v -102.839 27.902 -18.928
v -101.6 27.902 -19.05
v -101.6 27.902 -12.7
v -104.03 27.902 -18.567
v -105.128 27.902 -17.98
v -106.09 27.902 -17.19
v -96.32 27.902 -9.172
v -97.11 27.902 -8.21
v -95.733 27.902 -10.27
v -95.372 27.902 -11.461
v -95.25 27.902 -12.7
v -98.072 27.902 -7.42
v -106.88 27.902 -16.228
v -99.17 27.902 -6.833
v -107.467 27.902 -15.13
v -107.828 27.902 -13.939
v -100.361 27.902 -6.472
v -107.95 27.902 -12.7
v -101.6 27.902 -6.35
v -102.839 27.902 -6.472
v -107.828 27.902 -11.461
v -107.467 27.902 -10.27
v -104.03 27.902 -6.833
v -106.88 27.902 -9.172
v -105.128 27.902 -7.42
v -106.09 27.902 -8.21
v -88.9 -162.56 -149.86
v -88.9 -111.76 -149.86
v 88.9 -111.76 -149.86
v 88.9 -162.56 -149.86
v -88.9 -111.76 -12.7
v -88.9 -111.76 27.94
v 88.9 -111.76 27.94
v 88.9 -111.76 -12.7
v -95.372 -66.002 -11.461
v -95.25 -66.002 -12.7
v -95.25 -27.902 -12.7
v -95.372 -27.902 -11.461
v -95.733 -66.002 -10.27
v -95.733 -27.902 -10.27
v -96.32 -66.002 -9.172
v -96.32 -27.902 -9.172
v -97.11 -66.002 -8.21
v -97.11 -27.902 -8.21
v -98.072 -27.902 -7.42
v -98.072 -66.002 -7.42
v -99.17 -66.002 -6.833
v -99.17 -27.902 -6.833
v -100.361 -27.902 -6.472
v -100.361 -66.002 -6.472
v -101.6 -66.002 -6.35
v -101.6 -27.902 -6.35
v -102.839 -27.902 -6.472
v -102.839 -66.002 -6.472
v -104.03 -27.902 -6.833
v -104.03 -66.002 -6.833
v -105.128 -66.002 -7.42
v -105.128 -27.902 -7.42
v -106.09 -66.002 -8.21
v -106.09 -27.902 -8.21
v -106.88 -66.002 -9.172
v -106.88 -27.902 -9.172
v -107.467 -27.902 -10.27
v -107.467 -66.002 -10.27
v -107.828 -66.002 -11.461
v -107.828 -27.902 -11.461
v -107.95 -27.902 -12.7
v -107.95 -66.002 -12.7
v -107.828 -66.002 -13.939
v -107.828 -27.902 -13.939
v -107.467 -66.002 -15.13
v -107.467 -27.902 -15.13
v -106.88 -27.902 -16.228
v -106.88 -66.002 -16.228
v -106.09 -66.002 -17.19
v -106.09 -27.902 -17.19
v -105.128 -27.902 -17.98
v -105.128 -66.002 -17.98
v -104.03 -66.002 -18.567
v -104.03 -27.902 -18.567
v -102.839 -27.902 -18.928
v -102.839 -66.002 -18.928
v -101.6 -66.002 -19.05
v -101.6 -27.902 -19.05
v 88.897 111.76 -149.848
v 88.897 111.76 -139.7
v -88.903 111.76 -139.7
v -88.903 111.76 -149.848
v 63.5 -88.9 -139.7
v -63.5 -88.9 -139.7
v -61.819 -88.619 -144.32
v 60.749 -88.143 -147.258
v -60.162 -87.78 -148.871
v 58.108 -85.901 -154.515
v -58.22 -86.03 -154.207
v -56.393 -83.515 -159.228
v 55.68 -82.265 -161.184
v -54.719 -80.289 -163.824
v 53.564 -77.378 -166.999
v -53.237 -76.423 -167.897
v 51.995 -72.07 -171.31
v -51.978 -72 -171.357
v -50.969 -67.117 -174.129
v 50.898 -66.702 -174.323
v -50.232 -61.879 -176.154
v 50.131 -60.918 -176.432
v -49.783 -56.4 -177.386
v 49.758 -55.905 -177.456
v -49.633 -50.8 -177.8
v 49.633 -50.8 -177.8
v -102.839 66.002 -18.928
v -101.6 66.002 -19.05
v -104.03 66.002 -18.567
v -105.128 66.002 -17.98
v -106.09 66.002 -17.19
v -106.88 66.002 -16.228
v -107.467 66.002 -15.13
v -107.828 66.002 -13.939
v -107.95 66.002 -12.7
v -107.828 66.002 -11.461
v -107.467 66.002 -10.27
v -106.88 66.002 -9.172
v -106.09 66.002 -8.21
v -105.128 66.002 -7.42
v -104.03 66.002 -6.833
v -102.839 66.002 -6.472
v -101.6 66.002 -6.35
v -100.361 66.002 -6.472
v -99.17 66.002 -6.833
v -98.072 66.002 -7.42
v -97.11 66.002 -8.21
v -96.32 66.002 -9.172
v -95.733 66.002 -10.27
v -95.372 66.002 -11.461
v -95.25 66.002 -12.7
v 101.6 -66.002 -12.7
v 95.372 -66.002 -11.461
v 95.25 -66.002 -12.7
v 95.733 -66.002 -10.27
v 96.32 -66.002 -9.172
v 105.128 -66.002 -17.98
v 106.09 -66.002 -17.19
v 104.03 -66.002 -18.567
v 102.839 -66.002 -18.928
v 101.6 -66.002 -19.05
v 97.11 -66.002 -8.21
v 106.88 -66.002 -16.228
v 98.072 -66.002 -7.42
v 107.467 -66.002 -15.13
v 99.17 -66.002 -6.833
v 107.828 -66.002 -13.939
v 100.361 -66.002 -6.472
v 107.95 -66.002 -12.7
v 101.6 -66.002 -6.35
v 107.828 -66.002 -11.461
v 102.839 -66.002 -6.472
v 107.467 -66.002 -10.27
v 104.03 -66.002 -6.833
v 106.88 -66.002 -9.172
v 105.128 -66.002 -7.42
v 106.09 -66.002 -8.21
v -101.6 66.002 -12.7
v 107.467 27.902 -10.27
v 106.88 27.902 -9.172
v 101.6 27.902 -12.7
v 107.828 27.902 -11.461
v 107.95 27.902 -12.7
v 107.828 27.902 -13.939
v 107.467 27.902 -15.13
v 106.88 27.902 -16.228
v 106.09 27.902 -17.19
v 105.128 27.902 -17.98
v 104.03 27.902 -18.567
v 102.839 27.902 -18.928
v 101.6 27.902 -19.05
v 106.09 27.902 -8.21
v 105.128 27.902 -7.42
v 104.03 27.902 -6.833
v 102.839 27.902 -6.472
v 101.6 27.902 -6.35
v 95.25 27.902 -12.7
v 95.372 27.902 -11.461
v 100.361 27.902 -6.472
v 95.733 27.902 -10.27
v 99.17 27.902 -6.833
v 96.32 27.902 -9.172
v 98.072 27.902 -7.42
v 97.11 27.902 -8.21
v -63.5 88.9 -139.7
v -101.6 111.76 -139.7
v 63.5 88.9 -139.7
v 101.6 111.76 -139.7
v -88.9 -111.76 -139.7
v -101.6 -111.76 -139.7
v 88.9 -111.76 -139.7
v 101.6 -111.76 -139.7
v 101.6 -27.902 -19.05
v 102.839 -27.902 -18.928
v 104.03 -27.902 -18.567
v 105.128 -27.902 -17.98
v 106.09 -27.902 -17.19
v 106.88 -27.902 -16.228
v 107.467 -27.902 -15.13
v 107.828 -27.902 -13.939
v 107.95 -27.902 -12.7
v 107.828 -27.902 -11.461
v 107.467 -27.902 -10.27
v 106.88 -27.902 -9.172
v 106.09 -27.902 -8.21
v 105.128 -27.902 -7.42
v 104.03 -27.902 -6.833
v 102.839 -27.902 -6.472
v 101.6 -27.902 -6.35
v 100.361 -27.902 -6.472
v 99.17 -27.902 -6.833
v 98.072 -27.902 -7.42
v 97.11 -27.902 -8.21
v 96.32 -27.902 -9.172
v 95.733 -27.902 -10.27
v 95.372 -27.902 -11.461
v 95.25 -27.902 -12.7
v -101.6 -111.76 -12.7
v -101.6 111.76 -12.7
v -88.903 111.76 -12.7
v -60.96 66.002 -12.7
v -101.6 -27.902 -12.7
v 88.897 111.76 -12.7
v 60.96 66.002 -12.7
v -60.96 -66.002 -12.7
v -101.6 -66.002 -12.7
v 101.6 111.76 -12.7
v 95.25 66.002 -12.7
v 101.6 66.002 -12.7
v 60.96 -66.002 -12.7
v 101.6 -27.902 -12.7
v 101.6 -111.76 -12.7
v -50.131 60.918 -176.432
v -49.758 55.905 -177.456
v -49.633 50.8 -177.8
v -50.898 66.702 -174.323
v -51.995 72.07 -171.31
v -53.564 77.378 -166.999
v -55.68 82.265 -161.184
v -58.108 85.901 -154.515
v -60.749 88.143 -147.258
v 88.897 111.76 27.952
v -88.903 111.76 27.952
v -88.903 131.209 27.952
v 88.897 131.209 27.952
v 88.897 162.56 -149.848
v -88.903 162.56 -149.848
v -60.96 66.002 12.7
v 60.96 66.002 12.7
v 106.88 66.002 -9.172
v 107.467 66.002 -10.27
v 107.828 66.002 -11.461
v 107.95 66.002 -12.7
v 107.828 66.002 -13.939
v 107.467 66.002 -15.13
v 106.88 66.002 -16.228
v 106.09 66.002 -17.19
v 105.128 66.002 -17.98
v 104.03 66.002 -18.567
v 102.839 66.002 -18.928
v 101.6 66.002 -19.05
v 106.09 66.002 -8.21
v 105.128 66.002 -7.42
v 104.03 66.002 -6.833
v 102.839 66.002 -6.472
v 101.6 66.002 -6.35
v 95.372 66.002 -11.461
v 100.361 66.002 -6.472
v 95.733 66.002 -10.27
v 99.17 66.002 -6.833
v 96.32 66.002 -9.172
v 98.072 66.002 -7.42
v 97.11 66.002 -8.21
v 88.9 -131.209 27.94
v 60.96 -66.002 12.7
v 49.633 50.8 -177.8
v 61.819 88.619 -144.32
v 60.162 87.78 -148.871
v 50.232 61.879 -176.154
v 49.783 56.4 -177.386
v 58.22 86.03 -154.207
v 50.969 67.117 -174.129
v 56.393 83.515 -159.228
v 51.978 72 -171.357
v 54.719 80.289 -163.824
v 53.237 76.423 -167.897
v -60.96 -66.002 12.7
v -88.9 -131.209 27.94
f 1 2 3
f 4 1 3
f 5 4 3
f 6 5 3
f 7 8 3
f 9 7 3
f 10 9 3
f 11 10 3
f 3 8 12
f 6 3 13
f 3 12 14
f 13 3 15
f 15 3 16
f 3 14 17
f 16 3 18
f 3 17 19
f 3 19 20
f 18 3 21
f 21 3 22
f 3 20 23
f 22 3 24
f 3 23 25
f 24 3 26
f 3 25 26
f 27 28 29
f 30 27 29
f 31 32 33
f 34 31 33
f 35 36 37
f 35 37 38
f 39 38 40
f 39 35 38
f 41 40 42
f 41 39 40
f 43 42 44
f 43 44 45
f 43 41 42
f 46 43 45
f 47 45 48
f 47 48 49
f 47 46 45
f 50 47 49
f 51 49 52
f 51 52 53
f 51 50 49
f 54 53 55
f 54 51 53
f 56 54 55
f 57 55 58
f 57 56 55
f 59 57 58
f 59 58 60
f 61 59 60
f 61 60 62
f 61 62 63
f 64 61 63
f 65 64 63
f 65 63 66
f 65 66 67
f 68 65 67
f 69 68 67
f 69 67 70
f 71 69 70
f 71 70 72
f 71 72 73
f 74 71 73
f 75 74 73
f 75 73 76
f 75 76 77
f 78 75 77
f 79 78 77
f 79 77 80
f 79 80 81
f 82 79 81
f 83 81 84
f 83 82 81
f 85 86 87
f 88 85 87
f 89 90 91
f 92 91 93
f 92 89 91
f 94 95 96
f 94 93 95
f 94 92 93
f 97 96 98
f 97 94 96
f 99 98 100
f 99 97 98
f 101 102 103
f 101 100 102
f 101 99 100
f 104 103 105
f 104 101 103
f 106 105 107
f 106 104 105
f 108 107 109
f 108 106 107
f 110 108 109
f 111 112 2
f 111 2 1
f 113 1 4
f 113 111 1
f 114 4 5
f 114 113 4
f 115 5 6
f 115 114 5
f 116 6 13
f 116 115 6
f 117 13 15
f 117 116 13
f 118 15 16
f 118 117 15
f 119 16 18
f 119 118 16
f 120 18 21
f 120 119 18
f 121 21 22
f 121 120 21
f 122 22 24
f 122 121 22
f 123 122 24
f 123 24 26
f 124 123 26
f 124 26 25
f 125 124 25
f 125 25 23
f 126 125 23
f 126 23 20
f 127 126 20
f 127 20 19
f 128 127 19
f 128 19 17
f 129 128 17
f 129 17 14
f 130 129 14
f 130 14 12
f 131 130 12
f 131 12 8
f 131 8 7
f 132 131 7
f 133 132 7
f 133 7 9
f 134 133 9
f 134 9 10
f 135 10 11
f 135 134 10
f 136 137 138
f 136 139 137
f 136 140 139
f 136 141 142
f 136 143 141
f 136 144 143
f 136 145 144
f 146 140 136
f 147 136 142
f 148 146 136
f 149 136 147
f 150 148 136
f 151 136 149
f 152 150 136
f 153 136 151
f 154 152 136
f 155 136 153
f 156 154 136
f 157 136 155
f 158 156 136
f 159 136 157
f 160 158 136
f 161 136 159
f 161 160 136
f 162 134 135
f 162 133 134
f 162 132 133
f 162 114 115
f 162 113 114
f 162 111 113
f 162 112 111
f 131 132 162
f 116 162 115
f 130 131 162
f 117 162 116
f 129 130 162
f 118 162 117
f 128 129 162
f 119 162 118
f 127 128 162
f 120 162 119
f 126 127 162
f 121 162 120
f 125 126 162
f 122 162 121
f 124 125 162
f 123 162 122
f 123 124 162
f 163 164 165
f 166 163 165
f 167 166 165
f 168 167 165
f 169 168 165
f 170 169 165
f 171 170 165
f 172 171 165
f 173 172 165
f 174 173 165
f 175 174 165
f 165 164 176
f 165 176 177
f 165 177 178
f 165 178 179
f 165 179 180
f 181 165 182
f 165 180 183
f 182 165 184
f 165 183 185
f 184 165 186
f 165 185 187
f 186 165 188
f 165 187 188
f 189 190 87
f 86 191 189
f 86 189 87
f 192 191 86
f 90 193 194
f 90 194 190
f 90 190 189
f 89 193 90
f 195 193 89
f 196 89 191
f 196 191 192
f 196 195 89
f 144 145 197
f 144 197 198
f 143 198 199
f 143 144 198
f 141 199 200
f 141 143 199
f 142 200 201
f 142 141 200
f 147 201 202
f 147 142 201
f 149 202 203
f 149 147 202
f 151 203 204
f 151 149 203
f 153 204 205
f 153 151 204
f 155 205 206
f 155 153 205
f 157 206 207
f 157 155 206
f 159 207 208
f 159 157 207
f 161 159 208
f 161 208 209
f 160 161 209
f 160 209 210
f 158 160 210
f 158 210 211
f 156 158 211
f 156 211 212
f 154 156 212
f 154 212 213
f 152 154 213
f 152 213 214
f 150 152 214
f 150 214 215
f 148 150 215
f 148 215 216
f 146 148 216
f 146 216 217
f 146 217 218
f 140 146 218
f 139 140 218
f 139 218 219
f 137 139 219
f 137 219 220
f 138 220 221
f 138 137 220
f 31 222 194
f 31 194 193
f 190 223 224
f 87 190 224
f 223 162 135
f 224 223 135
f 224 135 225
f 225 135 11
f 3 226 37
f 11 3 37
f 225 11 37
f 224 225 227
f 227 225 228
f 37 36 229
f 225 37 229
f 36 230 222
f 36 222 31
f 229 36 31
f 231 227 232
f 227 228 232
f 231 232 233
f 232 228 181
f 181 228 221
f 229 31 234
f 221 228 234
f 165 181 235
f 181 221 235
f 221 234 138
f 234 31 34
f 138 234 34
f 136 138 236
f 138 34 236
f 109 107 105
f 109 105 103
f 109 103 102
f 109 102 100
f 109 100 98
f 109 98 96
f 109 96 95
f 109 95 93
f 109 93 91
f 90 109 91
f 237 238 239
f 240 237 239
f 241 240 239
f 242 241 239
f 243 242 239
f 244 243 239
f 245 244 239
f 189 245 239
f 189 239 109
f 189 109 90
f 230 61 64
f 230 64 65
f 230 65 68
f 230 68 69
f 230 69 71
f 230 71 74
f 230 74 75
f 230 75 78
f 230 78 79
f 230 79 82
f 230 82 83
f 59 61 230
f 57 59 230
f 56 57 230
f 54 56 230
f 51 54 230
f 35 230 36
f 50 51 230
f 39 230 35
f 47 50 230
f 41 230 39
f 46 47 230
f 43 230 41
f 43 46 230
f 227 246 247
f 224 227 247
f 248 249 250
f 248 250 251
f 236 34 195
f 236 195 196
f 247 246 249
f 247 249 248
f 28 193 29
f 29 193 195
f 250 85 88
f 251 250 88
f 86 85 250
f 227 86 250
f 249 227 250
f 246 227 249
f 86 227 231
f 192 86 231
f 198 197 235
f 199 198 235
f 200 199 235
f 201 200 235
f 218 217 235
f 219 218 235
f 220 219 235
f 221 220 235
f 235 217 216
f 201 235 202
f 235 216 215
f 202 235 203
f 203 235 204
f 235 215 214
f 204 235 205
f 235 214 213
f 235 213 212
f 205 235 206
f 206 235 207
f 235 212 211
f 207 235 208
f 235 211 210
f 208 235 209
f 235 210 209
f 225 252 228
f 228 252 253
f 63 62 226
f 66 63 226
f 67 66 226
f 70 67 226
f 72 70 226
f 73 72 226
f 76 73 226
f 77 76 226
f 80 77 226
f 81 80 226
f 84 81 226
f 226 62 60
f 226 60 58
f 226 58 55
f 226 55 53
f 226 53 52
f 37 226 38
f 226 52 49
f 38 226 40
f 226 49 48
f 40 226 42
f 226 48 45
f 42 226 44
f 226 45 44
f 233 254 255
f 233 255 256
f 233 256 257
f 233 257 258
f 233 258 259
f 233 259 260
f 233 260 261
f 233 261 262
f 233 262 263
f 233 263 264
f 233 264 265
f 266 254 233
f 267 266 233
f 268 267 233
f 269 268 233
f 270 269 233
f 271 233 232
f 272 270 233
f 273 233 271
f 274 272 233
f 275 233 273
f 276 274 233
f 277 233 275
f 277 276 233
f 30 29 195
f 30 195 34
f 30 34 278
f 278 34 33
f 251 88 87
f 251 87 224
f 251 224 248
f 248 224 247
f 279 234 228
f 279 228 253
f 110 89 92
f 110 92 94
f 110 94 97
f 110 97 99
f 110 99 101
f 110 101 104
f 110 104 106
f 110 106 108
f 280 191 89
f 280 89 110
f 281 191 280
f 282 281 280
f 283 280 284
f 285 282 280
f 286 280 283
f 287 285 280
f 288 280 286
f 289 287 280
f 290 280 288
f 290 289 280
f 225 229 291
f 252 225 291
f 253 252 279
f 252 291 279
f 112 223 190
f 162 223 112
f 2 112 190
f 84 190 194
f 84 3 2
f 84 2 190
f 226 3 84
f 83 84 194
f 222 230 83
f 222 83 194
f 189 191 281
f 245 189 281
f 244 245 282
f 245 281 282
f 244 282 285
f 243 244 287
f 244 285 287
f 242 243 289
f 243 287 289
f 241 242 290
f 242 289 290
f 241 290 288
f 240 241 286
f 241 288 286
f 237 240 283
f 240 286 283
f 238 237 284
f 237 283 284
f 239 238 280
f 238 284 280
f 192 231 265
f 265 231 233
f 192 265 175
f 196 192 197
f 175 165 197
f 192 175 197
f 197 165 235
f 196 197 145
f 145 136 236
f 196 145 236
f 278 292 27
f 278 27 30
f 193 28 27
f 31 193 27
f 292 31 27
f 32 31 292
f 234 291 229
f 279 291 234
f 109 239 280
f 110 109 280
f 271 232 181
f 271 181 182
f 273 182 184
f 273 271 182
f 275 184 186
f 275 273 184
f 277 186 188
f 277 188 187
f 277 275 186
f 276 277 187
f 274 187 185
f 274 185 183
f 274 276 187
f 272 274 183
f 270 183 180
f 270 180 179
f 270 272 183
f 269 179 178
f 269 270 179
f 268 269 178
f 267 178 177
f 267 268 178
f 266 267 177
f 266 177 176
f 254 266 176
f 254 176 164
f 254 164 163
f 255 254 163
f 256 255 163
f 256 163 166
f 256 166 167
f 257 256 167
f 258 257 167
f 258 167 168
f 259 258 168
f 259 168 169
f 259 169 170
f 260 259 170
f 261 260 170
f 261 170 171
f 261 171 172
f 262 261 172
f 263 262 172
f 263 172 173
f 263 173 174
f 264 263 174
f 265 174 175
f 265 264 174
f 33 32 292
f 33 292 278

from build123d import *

# Parameters (mm, degrees)
F0_W        = 121.92
F0_H        = 25.4
F1_DEPTH    = 66.0019
F2_W        = 203.2
F2_H        = 223.52
F3_DEPTH    = 25.4
F2_W_2      = 121.92
F2_H_2      = 132.0038
F4_DEPTH    = 127
F5_W        = 127
F5_H        = 177.8
F6_DEPTH    = 38.1
F7_R        = 38.09999
F8_T1_DEPTH = 299.2776586204
F9_W        = 177.8
F9_H        = 177.8
F10_DEPTH   = 50.8
F11_SIZE2   = 31.350927
F11_SIZE    = 177.79999
F12_W       = 177.8
F12_H       = 177.8
F13_DEPTH   = 50.8
F14_SIZE2   = 31.350927
F14_SIZE    = 177.79999
F15_R       = 6.35
F16_DEPTH   = 38.1
F17_R       = 6.35
F18_DEPTH   = 38.1
F19_R       = 6.35
F20_DEPTH   = 38.1
F21_R       = 6.35
F22_DEPTH   = 38.1


# Not quite as in the source:
# - a fillet or chamfer that OpenCascade refuses, or shapes differently, is made with other operations: its cross-section is extruded or revolved along the edge and cut away or added
# - a fillet or chamfer is up to 0.001 mm smaller than in the source, because OpenCascade refuses the exact size


with BuildPart() as f1:
    # F0 (on Front) → F1 (new body, symmetric)
    with BuildSketch(Plane.XZ):
        Rectangle(F0_W, F0_H)
    extrude(amount=F1_DEPTH, both=True)

    # F2 (on face) → F3 (join)
    with BuildSketch(Plane(origin=(0, 0, -12.7), x_dir=(1, 0, 0), z_dir=(0, 0, -1))):
        Rectangle(F2_W, F2_H)
    extrude(amount=F3_DEPTH)

    # F2 (on face) → F4 (join)
    with BuildSketch(Plane(origin=(0, 0, -12.7), x_dir=(1, 0, 0), z_dir=(0, 0, -1))):
        Rectangle(F2_W, F2_H)
        Rectangle(F2_W_2, F2_H_2, mode=Mode.SUBTRACT)
        Rectangle(F2_W_2, F2_H_2)
    extrude(amount=F4_DEPTH)

    # F5 (on face) → F6 (join)
    with BuildSketch(Plane(origin=(0, 0, -139.7), x_dir=(1, 0, 0), z_dir=(0, 0, -1))):
        Rectangle(F5_W, F5_H)
    extrude(amount=F6_DEPTH)

    # F7 (radius 38.1 in the source; OpenCascade refuses exactly that, so slightly less here)
    f7_edges = [f1.edges().sort_by_distance(p)[0] for p in [
        (0, -88.9, -177.8),
        (0, 88.9, -177.8),
    ]]
    fillet(f7_edges, radius=F7_R)

    # F8: chamfer of 38.1 x 13.8672659255 on 2 edges, made by hand

    # F8_s2 → F8_t1 (cut)
    with BuildSketch(Plane.XZ.offset(-149.6388293102)):
        Polygon((63.5, -139.7), (49.6327340745, -177.8), (63.5, -177.8), align=None)
        Polygon((-49.6327340745, -177.8), (-63.5, -139.7), (-63.5, -177.8), align=None)
    extrude(amount=F8_T1_DEPTH, mode=Mode.SUBTRACT)

    # F9 (on face) → F10 (join)
    with BuildSketch(Plane.XZ.offset(111.76)):
        with Locations((1.431e-07, -60.9599946499)):
            Rectangle(F9_W, F9_H)
    extrude(amount=F10_DEPTH)

    # F11 (size 177.8 and 31.35093717 in the source; OpenCascade refuses exactly that, so slightly less here)
    f11_edges = [f1.edges().sort_by_distance(p)[0] for p in [
        (0, -162.56, 27.940005),
    ]]
    f11_side = f1.faces().sort_by_distance((0, -162.56, -60.959995))[0]
    chamfer(f11_edges, length=F11_SIZE, length2=F11_SIZE2, reference=f11_side)

    # F12 (on face) → F13 (join)
    with BuildSketch(Plane(origin=(0, 111.76, 0), x_dir=(-1, 0, 0), z_dir=(0, 1, 0))):
        with Locations((0.0031362507, -60.9484007582)):
            Rectangle(F12_W, F12_H)
    extrude(amount=F13_DEPTH)

    # F14 (size 177.8 and 31.35093717 in the source; OpenCascade refuses exactly that, so slightly less here)
    f14_edges = [f1.edges().sort_by_distance(p)[0] for p in [
        (-0.003136, 162.56, 27.951599),
    ]]
    f14_side = f1.faces().sort_by_distance((-0.003136, 162.56, -60.948401))[0]
    chamfer(f14_edges, length=F14_SIZE, length2=F14_SIZE2, reference=f14_side)

    # F15 (on face) → F16 (join)
    with BuildSketch(Plane(origin=(0, 66.0019, 0), x_dir=(-1, 0, 0), z_dir=(0, 1, 0))):
        with Locations((101.6, -12.7)):
            Circle(F15_R)
    extrude(amount=-F16_DEPTH)

    # F17 (on face) → F18 (join)
    with BuildSketch(Plane.XZ.offset(66.0019)):
        with Locations((-101.6, -12.7)):
            Circle(F17_R)
    extrude(amount=-F18_DEPTH)

    # F19 (on face) → F20 (join)
    with BuildSketch(Plane.XZ.offset(66.0019)):
        with Locations((101.6, -12.7)):
            Circle(F19_R)
    extrude(amount=-F20_DEPTH)

    # F21 (on face) → F22 (join)
    with BuildSketch(Plane(origin=(0, 66.0019, 0), x_dir=(-1, 0, 0), z_dir=(0, 1, 0))):
        with Locations((-101.6, -12.7)):
            Circle(F21_R)
    extrude(amount=-F22_DEPTH)


solid = f1.part
